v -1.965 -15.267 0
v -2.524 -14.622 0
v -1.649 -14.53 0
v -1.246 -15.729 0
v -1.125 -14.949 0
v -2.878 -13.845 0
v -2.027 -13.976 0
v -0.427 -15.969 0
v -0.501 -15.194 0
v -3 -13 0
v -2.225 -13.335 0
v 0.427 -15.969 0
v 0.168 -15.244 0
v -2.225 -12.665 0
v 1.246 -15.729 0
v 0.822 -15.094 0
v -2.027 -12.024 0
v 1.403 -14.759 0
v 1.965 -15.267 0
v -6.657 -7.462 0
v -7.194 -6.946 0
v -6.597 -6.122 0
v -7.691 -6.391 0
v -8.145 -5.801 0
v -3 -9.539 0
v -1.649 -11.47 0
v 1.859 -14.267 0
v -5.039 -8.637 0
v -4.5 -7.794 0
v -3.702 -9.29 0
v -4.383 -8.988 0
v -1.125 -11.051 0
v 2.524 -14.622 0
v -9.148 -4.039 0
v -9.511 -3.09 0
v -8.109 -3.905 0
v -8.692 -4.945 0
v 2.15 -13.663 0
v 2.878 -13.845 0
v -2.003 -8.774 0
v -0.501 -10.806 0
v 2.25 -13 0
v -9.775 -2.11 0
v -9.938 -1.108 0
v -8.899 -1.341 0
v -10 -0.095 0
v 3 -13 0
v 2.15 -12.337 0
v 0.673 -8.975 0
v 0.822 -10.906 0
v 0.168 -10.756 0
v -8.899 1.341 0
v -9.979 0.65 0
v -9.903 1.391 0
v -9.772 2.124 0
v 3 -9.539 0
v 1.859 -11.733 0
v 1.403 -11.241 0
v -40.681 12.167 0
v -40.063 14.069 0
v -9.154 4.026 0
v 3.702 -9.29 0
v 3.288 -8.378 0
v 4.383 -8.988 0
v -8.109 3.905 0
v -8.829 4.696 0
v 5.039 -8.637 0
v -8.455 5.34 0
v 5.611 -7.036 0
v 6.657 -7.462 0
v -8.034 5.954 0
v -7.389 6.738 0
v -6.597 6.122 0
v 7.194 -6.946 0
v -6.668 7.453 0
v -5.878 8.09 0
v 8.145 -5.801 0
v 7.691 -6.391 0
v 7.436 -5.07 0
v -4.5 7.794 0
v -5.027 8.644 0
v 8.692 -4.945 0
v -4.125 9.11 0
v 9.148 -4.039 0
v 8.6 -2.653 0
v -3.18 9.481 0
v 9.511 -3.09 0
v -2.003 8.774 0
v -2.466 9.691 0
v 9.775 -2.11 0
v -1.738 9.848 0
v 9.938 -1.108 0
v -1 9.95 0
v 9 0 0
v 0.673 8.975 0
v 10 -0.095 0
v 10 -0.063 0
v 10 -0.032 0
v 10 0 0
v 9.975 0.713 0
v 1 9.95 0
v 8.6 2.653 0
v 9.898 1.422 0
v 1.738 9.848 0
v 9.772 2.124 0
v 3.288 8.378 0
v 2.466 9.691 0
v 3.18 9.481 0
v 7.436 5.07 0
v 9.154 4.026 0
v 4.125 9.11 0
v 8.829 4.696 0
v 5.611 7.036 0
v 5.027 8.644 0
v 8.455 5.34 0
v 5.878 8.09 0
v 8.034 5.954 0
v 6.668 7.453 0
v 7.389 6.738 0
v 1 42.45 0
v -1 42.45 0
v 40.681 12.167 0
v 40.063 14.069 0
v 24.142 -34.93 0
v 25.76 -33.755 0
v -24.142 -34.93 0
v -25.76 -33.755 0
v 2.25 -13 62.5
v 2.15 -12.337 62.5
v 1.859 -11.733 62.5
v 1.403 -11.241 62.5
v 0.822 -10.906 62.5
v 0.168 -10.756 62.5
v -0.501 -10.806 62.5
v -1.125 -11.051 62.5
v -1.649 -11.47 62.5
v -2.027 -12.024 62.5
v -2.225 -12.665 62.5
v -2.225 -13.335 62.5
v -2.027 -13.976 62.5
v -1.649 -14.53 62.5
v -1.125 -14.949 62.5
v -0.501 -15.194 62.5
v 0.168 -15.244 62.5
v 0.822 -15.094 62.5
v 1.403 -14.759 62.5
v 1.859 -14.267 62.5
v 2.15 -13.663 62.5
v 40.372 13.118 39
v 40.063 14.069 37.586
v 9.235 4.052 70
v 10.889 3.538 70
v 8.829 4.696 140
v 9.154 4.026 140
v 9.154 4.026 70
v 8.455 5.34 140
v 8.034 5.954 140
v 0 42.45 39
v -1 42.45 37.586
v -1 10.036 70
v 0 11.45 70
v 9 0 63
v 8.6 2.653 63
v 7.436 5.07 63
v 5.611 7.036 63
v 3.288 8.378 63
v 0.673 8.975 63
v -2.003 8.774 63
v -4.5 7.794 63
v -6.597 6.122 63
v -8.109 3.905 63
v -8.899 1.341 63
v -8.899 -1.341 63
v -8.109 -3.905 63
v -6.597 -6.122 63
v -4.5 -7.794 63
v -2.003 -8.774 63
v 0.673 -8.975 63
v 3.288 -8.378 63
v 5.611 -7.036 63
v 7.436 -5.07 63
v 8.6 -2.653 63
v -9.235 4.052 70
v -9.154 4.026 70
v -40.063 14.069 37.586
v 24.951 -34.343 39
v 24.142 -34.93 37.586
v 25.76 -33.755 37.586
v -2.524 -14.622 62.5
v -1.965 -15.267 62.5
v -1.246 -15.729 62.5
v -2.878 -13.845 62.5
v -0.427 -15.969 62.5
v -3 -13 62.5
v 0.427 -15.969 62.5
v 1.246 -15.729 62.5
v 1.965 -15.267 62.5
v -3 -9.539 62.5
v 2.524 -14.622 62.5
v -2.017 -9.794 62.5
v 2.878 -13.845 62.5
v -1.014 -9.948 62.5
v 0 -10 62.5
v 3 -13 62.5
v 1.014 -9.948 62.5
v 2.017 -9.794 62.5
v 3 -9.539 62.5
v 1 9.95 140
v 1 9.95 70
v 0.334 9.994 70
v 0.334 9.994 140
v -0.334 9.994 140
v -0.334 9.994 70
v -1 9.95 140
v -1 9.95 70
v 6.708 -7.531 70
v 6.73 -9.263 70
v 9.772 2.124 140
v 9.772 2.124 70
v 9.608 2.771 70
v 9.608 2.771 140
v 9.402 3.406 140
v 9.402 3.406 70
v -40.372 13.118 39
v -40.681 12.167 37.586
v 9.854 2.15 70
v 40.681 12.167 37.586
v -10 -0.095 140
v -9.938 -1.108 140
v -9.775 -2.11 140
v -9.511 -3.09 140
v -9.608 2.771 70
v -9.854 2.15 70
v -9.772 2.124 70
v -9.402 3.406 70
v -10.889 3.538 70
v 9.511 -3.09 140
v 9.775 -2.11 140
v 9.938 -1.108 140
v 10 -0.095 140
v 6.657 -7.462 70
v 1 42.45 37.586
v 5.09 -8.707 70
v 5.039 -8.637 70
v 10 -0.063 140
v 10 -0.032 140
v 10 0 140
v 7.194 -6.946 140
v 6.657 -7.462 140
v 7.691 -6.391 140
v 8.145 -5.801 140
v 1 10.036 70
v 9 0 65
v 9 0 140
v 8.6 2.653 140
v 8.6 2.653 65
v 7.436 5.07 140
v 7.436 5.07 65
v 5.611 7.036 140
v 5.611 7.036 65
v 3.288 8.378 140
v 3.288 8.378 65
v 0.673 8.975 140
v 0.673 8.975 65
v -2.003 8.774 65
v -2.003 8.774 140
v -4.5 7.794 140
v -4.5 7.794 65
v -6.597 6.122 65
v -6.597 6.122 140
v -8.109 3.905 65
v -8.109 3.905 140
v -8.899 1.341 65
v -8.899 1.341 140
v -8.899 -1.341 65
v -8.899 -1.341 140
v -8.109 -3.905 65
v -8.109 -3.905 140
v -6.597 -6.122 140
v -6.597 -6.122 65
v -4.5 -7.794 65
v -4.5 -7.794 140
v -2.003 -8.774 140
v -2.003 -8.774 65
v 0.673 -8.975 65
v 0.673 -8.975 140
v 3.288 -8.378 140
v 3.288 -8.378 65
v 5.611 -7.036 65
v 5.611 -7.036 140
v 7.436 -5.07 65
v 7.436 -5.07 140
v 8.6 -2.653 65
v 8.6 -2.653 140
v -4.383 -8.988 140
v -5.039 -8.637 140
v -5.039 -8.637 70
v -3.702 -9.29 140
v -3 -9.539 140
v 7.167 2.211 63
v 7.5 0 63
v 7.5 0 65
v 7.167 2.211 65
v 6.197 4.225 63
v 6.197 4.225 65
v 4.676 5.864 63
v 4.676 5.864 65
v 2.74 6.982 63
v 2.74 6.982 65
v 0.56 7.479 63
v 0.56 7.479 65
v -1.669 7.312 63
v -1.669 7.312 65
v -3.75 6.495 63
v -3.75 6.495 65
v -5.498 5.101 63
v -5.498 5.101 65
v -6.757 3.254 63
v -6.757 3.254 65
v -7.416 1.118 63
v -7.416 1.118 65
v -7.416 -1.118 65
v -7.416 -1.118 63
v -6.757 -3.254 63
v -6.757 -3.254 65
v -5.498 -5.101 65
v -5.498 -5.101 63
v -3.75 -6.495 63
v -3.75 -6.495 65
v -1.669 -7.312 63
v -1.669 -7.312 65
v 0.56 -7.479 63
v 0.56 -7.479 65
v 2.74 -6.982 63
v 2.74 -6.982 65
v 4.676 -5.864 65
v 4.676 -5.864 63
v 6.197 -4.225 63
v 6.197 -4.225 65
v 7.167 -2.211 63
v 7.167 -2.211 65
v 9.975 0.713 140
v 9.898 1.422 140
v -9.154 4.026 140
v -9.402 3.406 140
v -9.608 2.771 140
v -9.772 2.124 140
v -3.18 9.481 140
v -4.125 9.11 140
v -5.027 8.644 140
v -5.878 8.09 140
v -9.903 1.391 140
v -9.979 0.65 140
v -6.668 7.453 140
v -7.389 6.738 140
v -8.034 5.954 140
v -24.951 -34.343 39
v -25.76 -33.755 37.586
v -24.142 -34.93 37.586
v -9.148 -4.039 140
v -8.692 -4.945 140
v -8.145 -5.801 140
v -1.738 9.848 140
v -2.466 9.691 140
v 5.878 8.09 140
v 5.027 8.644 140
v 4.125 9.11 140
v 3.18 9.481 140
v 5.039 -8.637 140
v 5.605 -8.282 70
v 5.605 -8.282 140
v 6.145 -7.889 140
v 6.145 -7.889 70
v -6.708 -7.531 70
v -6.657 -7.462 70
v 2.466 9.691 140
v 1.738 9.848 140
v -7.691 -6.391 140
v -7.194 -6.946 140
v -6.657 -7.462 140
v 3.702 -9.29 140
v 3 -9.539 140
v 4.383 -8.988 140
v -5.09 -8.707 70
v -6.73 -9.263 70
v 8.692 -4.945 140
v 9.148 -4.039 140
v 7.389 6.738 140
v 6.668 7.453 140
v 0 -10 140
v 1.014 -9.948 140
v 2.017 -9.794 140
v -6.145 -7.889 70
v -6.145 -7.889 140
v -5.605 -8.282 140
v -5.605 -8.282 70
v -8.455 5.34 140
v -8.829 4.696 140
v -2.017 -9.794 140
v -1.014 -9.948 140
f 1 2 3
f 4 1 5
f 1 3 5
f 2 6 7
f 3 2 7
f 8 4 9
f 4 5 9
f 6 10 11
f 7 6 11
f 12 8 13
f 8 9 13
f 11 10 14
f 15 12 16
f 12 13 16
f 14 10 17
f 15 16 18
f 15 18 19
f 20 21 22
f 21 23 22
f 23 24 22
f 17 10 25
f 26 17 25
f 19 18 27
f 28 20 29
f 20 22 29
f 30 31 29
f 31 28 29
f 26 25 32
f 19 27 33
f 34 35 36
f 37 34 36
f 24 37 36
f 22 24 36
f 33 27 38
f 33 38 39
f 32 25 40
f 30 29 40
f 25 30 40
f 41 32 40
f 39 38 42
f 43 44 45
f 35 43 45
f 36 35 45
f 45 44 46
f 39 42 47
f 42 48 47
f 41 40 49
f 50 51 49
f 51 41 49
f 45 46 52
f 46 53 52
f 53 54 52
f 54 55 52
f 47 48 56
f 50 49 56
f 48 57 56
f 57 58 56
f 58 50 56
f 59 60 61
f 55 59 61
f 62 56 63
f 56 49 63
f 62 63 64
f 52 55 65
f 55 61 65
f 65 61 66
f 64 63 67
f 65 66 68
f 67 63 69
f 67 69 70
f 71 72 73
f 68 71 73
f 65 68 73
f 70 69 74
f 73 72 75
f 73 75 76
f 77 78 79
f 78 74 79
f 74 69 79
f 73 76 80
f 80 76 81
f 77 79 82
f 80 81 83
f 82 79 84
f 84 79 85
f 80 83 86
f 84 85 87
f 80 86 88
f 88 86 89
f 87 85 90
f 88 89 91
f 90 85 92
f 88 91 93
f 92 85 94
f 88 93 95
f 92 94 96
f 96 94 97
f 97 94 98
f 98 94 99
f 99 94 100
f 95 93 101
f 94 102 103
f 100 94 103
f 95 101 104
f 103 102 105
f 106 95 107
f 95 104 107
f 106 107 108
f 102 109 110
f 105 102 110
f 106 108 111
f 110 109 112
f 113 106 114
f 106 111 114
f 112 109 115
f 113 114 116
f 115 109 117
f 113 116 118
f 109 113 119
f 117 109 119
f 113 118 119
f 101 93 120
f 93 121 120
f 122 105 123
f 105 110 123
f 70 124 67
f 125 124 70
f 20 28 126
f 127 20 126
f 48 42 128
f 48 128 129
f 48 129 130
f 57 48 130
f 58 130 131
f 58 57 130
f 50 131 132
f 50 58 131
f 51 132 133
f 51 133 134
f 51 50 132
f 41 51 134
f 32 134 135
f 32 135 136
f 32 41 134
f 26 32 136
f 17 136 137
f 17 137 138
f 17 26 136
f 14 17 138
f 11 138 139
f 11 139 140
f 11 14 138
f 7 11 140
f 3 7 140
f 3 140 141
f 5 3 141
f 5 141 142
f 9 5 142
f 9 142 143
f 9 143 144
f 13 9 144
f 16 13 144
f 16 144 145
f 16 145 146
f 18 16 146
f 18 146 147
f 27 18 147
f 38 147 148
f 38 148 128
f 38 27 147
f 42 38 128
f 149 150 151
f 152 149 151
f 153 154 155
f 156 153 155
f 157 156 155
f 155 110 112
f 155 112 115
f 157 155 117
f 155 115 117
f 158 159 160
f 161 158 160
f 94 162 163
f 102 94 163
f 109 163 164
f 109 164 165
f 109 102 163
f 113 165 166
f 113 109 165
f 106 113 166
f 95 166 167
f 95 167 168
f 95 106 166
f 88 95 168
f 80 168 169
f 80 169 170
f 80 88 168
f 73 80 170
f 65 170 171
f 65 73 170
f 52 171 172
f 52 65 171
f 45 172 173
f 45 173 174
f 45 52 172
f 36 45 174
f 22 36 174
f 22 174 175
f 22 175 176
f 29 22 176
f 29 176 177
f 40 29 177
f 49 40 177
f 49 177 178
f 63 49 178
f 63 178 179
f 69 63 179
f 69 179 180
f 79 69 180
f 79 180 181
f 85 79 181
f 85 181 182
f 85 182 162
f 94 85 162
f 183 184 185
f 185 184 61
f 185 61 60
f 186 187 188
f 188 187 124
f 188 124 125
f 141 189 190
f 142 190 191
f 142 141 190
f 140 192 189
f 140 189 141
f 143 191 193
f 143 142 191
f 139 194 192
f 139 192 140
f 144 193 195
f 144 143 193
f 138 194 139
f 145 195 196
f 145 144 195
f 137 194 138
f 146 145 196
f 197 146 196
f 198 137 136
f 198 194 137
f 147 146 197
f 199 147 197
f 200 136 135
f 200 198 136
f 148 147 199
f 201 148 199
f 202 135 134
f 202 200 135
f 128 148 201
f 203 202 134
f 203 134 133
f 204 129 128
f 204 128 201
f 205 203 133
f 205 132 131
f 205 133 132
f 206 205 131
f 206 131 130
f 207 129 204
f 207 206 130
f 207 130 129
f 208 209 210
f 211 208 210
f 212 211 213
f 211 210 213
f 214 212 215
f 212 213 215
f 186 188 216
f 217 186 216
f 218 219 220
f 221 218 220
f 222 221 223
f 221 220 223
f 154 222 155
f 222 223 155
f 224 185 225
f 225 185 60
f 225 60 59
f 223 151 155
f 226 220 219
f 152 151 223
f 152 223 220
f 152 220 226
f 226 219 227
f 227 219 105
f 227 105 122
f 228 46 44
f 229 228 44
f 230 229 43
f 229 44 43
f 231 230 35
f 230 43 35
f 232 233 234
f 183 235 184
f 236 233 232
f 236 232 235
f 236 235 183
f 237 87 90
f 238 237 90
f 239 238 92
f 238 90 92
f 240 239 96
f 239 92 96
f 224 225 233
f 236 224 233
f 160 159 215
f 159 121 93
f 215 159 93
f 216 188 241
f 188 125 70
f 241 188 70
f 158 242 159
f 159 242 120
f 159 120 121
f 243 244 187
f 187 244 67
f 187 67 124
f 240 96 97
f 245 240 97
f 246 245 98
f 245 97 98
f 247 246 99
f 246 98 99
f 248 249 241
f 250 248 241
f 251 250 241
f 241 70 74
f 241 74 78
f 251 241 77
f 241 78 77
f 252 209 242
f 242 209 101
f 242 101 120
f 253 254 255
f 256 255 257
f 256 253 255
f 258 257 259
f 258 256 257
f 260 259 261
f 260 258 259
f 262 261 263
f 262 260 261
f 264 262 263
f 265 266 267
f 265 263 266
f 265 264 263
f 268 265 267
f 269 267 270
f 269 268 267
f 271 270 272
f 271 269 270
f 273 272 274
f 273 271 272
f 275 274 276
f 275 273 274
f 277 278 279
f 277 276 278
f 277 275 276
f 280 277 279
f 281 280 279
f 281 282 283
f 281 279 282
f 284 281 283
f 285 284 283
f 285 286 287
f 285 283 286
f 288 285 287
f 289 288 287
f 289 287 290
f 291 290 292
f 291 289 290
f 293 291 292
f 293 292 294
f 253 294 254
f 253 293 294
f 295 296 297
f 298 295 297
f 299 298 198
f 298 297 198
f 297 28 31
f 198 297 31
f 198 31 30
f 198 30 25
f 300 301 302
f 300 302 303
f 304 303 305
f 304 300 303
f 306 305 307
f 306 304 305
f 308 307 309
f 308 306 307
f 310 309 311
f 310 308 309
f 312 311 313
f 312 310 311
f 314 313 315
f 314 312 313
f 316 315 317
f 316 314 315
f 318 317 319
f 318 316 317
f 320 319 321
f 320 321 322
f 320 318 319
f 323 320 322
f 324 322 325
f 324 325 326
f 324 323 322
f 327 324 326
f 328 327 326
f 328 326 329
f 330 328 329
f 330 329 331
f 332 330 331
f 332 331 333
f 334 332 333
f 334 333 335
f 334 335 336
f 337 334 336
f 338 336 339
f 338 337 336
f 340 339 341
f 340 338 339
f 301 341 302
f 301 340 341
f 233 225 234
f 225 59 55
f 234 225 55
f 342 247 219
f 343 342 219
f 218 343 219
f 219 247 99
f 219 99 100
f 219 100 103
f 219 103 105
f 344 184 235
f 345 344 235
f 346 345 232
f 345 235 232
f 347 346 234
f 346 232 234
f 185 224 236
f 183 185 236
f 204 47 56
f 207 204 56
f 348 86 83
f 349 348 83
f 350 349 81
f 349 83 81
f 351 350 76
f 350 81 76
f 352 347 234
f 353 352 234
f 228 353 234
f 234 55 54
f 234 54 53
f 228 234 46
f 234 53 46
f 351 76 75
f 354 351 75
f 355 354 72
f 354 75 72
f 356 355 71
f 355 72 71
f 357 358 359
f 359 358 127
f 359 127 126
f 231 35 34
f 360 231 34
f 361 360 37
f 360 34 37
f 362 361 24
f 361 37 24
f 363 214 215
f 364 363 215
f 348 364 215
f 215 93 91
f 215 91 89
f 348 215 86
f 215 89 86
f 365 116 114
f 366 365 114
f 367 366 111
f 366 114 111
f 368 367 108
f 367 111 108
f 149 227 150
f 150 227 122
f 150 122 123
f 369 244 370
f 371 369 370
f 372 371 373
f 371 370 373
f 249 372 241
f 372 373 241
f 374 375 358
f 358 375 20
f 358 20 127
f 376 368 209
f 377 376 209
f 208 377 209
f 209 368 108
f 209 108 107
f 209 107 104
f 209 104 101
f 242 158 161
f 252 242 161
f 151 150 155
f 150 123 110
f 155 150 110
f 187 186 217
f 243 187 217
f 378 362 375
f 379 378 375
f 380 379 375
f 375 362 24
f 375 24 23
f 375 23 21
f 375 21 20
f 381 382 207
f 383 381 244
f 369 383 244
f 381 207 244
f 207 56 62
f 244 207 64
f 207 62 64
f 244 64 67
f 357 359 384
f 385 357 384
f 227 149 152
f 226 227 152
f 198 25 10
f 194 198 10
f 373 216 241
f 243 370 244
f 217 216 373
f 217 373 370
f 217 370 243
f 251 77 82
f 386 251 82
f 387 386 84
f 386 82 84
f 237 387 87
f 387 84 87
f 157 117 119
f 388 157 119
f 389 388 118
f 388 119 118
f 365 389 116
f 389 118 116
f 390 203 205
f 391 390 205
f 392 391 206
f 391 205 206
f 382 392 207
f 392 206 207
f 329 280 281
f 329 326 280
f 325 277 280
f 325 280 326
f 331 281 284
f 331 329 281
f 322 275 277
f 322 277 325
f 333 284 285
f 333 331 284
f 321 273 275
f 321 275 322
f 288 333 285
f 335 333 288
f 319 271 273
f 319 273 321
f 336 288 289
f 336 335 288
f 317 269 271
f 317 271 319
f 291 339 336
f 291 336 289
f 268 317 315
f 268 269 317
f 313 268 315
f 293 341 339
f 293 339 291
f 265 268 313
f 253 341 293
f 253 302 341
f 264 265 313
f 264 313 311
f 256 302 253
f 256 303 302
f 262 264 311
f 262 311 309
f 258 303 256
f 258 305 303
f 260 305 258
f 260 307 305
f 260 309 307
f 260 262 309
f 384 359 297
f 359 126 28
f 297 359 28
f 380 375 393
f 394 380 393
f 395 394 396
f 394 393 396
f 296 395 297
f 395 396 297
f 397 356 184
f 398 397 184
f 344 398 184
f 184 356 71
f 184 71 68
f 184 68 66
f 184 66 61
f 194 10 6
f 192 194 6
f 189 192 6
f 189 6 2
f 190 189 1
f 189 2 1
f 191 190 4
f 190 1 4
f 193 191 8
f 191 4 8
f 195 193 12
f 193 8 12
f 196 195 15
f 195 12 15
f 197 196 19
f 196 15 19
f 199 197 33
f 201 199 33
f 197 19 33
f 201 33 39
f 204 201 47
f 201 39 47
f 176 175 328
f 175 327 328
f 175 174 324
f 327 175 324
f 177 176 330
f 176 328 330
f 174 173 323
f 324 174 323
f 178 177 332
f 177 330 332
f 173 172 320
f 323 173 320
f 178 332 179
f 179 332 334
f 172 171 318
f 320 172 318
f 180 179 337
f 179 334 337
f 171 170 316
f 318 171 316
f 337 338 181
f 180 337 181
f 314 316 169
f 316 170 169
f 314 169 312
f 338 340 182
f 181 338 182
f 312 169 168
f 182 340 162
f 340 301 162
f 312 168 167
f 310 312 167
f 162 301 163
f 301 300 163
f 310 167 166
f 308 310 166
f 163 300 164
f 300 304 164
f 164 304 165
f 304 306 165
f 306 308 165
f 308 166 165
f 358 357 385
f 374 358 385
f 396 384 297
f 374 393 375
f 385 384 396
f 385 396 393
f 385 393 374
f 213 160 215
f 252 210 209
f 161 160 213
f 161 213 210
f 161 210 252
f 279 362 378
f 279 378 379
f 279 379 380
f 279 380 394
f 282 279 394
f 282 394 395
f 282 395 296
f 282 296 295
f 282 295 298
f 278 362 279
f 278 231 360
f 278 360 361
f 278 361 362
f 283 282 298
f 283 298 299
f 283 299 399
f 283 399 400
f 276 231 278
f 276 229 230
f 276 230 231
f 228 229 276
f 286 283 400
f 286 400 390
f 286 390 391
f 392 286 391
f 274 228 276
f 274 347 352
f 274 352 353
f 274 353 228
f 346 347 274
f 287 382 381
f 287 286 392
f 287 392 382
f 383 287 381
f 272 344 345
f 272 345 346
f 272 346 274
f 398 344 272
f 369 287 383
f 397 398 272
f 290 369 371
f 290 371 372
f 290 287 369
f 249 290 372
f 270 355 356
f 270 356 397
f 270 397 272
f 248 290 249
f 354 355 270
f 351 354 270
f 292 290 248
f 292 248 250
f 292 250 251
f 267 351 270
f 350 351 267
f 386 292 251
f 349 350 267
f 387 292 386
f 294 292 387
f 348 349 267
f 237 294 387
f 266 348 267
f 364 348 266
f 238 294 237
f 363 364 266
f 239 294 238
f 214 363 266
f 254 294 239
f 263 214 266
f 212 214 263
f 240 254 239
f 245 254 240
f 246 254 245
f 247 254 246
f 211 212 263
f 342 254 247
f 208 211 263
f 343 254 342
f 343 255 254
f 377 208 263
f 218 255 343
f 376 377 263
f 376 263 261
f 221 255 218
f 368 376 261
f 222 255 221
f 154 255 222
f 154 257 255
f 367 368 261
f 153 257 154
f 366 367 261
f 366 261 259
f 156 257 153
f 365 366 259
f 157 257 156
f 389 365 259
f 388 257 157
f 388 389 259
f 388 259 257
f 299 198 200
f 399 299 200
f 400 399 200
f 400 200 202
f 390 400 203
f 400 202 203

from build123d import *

# Parameters (mm, degrees)
F0_R     = 9
F1_DEPTH = 140
F2_DEPTH = 70
F3_SIZE  = 31
F4_SIZE  = 0.99999
F5_COUNT = 5
F0_R_2   = 2.25
F6_DEPTH = 62.5
F7_START = 63
F0_R_3   = 7.5
F7_DEPTH = 2


# Not quite as in the source:
# - a fillet or chamfer is up to 0.001 mm smaller than in the source, because OpenCascade refuses the exact size


with BuildPart() as f1:
    # F0 (on Top) → F1 (new body)
    with BuildSketch(Plane.XY):
        with BuildLine():
            ThreePointArc((3, -9.5393920142), (8.0622577483, -5.9160797831), (10, 0))
            ThreePointArc((10, 0), (7.4161984871, 6.7082039325), (1, 9.9498743711))
            ThreePointArc((1, 9.9498743711), (0, 10), (-1, 9.9498743711))
            ThreePointArc((-1, 9.9498743711), (-9.9477573381, 1.0208447195), (-3, -9.5393920142))
            ThreePointArc((-3, -9.5393920142), (-1.5175770051, -9.8841772563), (-2.49e-08, -10))
            ThreePointArc((-2.49e-08, -10), (1.5175769805, -9.8841772601), (3, -9.5393920142))
        make_face()
        Circle(F0_R, mode=Mode.SUBTRACT)
    extrude(amount=F1_DEPTH)

    # F0 (on Top) → F2 (join)
    with BuildSketch(Plane.XY):
        with BuildLine():
            ThreePointArc((-1, 9.9498743711), (0, 10), (1, 9.9498743711))
            Line((1, 9.9498743711), (1, 42.4498743711))
            Line((1, 42.4498743711), (-1, 42.4498743711))
            Line((-1, 42.4498743711), (-1, 9.9498743711))
        make_face()
    extrude(amount=F2_DEPTH)

    # F3
    f3_edges = [f1.edges().sort_by_distance(p)[0] for p in [
        (0, 42.449874, 70),
    ]]
    chamfer(f3_edges, length=F3_SIZE)

    # F4 (size 1 in the source; OpenCascade refuses exactly that, so slightly less here)
    f4_edges = [f1.edges().sort_by_distance(p)[0] for p in [
        (-1, 26.949874, 54.5),
        (1, 26.949874, 54.5),
    ]]
    chamfer(f4_edges, length=F4_SIZE)

    # F5: F1 ×5 about axis
    f5_axis = Axis((0, 0, 0), (0, 0, -1))


with BuildPart() as f1_1:
    add(f1.part)
    for i in range(1, F5_COUNT):
        add(f1.part.rotate(f5_axis, i * 360 / F5_COUNT))

    # F0 (on Top) → F6 (join)
    with BuildSketch(Plane.XY):
        with BuildLine():
            ThreePointArc((-3, -13), (-2.1213203524, -10.8786796652), (-2.49e-08, -10))
            ThreePointArc((-2.49e-08, -10), (-1.5175770051, -9.8841772563), (-3, -9.5393920142))
            Line((-3, -9.5393920142), (-3, -13))
        make_face()
        with BuildLine():
            Line((3, -13), (3, -9.5393920142))
            ThreePointArc((3, -9.5393920142), (1.5175769805, -9.8841772601), (-2.49e-08, -10))
            ThreePointArc((-2.49e-08, -10), (2.1213203348, -10.8786796476), (3, -13))
        make_face()
        with BuildLine():
            ThreePointArc((3, -13), (2.1213203348, -10.8786796476), (-2.49e-08, -10))
            ThreePointArc((-2.49e-08, -10), (-2.1213203524, -10.8786796652), (-3, -13))
            ThreePointArc((-3, -13), (0, -16), (3, -13))
        make_face()
        with Locations((0, -13)):
            Circle(F0_R_2, mode=Mode.SUBTRACT)
    extrude(amount=F6_DEPTH)

    # F0 (on Top) → F7 (join)
    with BuildSketch(Plane.XY.offset(F7_START)):
        Circle(F0_R)
        Circle(F0_R_3, mode=Mode.SUBTRACT)
    extrude(amount=F7_DEPTH)


solid = f1_1.part
